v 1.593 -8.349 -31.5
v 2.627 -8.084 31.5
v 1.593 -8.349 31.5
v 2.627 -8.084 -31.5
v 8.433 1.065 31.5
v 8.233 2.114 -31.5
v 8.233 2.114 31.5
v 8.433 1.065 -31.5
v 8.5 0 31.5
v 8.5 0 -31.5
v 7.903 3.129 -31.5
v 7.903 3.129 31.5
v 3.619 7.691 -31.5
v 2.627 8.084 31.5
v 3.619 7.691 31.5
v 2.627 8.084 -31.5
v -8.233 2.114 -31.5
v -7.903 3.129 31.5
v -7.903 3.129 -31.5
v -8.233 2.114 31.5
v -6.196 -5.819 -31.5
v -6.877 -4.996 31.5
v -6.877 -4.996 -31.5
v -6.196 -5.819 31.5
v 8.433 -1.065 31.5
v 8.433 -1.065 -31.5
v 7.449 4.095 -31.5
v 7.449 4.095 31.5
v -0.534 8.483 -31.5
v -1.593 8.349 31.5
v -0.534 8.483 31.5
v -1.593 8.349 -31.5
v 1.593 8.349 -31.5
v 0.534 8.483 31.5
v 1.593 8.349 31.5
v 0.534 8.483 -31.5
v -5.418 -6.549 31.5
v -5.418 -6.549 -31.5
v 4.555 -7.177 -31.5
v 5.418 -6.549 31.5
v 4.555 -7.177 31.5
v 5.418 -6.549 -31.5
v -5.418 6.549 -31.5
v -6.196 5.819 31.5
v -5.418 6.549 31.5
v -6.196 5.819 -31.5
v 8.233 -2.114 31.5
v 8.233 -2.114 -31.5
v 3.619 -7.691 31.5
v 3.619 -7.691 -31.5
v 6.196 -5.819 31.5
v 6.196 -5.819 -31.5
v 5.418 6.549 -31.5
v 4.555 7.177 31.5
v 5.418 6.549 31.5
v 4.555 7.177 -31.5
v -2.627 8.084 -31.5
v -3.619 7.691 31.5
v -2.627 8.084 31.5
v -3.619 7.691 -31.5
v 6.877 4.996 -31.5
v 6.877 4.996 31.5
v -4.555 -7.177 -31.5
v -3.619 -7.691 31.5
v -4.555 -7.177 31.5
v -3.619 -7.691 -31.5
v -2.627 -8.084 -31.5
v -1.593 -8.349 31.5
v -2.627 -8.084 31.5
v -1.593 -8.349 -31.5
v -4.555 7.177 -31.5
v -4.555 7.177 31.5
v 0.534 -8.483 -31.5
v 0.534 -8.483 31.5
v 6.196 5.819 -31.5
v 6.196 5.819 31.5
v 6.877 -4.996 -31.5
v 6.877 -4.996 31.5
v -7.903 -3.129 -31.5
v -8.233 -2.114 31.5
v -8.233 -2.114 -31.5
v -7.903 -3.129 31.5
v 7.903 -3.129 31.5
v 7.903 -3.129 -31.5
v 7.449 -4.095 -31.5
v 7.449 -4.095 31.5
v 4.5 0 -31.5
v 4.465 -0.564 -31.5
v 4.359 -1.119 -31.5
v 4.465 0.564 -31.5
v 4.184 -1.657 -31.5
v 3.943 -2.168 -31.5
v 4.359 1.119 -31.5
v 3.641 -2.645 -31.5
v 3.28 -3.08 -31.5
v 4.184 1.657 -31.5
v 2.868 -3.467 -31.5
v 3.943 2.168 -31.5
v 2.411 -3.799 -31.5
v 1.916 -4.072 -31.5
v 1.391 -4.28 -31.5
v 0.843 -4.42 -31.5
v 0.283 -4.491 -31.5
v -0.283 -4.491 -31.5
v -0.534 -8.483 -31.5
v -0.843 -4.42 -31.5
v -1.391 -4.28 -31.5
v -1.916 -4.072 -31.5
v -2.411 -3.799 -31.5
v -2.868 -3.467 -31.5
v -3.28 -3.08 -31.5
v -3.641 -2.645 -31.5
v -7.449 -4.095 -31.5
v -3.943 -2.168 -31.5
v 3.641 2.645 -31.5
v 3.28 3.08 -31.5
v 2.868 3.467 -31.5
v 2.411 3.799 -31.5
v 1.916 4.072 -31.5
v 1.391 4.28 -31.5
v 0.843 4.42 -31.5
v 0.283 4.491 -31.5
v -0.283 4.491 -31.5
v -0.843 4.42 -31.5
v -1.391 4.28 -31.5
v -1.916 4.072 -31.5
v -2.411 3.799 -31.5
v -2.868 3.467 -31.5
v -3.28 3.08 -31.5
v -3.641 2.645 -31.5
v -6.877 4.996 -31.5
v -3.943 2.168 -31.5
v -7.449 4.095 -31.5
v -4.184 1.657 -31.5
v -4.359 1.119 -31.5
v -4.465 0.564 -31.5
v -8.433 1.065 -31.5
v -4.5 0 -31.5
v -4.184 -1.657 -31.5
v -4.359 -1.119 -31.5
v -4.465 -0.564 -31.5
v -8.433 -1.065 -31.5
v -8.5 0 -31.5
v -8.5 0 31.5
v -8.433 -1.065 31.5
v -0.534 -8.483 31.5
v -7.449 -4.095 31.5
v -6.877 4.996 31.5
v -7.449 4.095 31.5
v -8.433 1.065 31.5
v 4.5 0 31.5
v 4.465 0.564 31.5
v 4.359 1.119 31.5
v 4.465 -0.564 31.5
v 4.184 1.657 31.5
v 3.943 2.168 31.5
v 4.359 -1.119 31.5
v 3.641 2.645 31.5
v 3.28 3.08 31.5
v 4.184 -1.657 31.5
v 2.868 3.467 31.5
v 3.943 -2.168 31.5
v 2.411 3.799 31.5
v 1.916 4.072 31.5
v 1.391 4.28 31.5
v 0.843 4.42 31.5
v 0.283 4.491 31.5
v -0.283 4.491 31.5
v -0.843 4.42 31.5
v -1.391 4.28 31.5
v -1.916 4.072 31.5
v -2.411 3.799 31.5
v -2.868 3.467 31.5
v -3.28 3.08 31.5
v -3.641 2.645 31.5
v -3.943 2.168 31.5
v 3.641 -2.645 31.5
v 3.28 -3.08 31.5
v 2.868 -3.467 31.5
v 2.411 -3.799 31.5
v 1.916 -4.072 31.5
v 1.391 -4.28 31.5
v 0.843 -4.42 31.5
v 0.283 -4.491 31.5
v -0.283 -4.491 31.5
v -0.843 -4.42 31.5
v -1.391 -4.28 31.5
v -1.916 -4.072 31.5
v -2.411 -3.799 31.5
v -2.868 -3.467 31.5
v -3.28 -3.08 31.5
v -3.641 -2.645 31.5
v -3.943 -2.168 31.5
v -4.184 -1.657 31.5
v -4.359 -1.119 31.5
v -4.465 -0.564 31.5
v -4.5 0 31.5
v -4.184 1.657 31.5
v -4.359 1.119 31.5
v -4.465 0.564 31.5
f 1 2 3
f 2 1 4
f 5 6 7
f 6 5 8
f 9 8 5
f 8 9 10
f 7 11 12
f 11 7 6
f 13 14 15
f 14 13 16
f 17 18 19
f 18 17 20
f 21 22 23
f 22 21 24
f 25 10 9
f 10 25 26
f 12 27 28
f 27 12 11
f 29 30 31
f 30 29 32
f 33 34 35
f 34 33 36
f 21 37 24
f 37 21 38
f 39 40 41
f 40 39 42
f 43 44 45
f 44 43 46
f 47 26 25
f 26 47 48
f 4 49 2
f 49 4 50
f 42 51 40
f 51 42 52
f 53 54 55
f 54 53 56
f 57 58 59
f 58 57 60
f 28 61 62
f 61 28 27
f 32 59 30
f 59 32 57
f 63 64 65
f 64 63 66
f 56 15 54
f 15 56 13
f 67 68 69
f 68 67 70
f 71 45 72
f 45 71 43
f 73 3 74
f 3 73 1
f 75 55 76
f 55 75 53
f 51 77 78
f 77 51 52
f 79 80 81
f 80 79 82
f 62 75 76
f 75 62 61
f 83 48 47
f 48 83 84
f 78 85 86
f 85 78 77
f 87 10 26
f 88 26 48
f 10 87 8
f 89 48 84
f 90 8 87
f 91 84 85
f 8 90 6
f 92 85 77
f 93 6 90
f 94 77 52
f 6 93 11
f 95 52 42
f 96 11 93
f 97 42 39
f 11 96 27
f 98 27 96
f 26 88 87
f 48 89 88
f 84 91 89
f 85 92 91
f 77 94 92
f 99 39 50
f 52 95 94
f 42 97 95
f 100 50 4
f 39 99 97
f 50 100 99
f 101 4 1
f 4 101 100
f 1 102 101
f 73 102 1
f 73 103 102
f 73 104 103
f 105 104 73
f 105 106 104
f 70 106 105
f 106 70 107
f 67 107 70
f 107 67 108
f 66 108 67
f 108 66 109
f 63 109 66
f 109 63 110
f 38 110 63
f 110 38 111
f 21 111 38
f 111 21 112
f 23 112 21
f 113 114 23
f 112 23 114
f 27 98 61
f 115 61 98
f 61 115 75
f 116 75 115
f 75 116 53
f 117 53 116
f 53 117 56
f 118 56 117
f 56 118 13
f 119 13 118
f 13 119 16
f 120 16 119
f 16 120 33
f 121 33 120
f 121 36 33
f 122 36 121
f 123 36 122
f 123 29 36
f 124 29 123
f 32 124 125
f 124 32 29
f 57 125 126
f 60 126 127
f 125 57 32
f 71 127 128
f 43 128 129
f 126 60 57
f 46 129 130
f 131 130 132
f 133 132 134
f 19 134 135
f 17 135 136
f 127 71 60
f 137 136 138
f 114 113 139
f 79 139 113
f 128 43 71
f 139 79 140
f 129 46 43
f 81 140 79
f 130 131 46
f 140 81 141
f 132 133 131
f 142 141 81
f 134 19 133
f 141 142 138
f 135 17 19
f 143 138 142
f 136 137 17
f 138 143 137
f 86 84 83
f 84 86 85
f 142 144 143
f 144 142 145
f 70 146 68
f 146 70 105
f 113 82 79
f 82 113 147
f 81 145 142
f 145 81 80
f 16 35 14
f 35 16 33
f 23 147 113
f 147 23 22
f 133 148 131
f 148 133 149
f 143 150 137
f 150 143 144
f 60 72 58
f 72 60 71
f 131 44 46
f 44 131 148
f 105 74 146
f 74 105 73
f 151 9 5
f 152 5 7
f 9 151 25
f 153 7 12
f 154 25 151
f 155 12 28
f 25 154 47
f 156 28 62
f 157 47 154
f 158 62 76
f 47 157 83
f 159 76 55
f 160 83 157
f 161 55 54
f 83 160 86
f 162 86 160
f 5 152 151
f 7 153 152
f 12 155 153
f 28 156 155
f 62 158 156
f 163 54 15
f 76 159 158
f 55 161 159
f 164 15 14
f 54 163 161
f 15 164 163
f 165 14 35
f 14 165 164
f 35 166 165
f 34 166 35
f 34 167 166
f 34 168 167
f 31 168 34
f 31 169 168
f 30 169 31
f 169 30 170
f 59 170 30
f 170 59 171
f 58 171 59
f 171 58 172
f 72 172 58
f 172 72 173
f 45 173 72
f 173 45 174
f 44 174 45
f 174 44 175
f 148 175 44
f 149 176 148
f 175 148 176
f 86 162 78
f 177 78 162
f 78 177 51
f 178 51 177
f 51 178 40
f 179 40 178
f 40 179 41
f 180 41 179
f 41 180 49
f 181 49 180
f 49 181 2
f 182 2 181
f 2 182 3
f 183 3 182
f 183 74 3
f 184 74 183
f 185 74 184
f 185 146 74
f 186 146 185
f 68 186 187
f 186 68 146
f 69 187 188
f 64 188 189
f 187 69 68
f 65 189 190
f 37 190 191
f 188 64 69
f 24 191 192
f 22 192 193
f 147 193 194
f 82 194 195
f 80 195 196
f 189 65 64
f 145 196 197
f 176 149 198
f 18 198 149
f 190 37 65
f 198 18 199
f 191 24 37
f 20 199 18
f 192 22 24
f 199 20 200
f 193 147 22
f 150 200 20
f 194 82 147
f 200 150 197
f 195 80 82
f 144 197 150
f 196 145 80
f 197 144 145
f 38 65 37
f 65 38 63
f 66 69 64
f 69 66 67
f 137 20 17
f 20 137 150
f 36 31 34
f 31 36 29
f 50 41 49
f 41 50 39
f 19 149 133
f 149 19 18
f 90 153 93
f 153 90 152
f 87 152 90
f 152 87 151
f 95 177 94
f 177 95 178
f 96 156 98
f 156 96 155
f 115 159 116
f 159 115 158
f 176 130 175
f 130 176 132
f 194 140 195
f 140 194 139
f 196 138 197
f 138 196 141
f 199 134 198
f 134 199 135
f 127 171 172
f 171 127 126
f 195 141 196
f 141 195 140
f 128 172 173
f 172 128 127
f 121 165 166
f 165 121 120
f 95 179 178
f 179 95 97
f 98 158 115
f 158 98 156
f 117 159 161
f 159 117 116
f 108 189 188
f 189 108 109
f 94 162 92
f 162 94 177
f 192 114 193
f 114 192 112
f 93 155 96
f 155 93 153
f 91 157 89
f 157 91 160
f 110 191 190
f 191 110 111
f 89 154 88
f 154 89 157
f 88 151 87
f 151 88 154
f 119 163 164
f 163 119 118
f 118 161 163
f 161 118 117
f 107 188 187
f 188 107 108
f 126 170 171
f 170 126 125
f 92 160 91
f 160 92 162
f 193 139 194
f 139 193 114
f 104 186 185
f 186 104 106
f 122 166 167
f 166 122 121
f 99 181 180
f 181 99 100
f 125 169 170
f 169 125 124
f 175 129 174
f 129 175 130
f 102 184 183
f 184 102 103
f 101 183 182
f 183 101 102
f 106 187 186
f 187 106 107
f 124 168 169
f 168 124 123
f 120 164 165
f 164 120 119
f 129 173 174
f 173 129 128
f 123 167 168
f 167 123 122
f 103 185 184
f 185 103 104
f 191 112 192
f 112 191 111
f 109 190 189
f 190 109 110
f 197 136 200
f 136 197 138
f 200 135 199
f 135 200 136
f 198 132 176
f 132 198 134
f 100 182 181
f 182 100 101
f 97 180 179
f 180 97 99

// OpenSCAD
$fn = 50;


difference() {
	union() {
		translate(v = [0, 0, -31.5000000000]) {
			cylinder(h = 63, r = 8.5000000000);
		}
	}
	union() {
		translate(v = [0, 0, -100.0000000000]) {
			cylinder(h = 200, r = 4.5000000000);
		}
	}
}
